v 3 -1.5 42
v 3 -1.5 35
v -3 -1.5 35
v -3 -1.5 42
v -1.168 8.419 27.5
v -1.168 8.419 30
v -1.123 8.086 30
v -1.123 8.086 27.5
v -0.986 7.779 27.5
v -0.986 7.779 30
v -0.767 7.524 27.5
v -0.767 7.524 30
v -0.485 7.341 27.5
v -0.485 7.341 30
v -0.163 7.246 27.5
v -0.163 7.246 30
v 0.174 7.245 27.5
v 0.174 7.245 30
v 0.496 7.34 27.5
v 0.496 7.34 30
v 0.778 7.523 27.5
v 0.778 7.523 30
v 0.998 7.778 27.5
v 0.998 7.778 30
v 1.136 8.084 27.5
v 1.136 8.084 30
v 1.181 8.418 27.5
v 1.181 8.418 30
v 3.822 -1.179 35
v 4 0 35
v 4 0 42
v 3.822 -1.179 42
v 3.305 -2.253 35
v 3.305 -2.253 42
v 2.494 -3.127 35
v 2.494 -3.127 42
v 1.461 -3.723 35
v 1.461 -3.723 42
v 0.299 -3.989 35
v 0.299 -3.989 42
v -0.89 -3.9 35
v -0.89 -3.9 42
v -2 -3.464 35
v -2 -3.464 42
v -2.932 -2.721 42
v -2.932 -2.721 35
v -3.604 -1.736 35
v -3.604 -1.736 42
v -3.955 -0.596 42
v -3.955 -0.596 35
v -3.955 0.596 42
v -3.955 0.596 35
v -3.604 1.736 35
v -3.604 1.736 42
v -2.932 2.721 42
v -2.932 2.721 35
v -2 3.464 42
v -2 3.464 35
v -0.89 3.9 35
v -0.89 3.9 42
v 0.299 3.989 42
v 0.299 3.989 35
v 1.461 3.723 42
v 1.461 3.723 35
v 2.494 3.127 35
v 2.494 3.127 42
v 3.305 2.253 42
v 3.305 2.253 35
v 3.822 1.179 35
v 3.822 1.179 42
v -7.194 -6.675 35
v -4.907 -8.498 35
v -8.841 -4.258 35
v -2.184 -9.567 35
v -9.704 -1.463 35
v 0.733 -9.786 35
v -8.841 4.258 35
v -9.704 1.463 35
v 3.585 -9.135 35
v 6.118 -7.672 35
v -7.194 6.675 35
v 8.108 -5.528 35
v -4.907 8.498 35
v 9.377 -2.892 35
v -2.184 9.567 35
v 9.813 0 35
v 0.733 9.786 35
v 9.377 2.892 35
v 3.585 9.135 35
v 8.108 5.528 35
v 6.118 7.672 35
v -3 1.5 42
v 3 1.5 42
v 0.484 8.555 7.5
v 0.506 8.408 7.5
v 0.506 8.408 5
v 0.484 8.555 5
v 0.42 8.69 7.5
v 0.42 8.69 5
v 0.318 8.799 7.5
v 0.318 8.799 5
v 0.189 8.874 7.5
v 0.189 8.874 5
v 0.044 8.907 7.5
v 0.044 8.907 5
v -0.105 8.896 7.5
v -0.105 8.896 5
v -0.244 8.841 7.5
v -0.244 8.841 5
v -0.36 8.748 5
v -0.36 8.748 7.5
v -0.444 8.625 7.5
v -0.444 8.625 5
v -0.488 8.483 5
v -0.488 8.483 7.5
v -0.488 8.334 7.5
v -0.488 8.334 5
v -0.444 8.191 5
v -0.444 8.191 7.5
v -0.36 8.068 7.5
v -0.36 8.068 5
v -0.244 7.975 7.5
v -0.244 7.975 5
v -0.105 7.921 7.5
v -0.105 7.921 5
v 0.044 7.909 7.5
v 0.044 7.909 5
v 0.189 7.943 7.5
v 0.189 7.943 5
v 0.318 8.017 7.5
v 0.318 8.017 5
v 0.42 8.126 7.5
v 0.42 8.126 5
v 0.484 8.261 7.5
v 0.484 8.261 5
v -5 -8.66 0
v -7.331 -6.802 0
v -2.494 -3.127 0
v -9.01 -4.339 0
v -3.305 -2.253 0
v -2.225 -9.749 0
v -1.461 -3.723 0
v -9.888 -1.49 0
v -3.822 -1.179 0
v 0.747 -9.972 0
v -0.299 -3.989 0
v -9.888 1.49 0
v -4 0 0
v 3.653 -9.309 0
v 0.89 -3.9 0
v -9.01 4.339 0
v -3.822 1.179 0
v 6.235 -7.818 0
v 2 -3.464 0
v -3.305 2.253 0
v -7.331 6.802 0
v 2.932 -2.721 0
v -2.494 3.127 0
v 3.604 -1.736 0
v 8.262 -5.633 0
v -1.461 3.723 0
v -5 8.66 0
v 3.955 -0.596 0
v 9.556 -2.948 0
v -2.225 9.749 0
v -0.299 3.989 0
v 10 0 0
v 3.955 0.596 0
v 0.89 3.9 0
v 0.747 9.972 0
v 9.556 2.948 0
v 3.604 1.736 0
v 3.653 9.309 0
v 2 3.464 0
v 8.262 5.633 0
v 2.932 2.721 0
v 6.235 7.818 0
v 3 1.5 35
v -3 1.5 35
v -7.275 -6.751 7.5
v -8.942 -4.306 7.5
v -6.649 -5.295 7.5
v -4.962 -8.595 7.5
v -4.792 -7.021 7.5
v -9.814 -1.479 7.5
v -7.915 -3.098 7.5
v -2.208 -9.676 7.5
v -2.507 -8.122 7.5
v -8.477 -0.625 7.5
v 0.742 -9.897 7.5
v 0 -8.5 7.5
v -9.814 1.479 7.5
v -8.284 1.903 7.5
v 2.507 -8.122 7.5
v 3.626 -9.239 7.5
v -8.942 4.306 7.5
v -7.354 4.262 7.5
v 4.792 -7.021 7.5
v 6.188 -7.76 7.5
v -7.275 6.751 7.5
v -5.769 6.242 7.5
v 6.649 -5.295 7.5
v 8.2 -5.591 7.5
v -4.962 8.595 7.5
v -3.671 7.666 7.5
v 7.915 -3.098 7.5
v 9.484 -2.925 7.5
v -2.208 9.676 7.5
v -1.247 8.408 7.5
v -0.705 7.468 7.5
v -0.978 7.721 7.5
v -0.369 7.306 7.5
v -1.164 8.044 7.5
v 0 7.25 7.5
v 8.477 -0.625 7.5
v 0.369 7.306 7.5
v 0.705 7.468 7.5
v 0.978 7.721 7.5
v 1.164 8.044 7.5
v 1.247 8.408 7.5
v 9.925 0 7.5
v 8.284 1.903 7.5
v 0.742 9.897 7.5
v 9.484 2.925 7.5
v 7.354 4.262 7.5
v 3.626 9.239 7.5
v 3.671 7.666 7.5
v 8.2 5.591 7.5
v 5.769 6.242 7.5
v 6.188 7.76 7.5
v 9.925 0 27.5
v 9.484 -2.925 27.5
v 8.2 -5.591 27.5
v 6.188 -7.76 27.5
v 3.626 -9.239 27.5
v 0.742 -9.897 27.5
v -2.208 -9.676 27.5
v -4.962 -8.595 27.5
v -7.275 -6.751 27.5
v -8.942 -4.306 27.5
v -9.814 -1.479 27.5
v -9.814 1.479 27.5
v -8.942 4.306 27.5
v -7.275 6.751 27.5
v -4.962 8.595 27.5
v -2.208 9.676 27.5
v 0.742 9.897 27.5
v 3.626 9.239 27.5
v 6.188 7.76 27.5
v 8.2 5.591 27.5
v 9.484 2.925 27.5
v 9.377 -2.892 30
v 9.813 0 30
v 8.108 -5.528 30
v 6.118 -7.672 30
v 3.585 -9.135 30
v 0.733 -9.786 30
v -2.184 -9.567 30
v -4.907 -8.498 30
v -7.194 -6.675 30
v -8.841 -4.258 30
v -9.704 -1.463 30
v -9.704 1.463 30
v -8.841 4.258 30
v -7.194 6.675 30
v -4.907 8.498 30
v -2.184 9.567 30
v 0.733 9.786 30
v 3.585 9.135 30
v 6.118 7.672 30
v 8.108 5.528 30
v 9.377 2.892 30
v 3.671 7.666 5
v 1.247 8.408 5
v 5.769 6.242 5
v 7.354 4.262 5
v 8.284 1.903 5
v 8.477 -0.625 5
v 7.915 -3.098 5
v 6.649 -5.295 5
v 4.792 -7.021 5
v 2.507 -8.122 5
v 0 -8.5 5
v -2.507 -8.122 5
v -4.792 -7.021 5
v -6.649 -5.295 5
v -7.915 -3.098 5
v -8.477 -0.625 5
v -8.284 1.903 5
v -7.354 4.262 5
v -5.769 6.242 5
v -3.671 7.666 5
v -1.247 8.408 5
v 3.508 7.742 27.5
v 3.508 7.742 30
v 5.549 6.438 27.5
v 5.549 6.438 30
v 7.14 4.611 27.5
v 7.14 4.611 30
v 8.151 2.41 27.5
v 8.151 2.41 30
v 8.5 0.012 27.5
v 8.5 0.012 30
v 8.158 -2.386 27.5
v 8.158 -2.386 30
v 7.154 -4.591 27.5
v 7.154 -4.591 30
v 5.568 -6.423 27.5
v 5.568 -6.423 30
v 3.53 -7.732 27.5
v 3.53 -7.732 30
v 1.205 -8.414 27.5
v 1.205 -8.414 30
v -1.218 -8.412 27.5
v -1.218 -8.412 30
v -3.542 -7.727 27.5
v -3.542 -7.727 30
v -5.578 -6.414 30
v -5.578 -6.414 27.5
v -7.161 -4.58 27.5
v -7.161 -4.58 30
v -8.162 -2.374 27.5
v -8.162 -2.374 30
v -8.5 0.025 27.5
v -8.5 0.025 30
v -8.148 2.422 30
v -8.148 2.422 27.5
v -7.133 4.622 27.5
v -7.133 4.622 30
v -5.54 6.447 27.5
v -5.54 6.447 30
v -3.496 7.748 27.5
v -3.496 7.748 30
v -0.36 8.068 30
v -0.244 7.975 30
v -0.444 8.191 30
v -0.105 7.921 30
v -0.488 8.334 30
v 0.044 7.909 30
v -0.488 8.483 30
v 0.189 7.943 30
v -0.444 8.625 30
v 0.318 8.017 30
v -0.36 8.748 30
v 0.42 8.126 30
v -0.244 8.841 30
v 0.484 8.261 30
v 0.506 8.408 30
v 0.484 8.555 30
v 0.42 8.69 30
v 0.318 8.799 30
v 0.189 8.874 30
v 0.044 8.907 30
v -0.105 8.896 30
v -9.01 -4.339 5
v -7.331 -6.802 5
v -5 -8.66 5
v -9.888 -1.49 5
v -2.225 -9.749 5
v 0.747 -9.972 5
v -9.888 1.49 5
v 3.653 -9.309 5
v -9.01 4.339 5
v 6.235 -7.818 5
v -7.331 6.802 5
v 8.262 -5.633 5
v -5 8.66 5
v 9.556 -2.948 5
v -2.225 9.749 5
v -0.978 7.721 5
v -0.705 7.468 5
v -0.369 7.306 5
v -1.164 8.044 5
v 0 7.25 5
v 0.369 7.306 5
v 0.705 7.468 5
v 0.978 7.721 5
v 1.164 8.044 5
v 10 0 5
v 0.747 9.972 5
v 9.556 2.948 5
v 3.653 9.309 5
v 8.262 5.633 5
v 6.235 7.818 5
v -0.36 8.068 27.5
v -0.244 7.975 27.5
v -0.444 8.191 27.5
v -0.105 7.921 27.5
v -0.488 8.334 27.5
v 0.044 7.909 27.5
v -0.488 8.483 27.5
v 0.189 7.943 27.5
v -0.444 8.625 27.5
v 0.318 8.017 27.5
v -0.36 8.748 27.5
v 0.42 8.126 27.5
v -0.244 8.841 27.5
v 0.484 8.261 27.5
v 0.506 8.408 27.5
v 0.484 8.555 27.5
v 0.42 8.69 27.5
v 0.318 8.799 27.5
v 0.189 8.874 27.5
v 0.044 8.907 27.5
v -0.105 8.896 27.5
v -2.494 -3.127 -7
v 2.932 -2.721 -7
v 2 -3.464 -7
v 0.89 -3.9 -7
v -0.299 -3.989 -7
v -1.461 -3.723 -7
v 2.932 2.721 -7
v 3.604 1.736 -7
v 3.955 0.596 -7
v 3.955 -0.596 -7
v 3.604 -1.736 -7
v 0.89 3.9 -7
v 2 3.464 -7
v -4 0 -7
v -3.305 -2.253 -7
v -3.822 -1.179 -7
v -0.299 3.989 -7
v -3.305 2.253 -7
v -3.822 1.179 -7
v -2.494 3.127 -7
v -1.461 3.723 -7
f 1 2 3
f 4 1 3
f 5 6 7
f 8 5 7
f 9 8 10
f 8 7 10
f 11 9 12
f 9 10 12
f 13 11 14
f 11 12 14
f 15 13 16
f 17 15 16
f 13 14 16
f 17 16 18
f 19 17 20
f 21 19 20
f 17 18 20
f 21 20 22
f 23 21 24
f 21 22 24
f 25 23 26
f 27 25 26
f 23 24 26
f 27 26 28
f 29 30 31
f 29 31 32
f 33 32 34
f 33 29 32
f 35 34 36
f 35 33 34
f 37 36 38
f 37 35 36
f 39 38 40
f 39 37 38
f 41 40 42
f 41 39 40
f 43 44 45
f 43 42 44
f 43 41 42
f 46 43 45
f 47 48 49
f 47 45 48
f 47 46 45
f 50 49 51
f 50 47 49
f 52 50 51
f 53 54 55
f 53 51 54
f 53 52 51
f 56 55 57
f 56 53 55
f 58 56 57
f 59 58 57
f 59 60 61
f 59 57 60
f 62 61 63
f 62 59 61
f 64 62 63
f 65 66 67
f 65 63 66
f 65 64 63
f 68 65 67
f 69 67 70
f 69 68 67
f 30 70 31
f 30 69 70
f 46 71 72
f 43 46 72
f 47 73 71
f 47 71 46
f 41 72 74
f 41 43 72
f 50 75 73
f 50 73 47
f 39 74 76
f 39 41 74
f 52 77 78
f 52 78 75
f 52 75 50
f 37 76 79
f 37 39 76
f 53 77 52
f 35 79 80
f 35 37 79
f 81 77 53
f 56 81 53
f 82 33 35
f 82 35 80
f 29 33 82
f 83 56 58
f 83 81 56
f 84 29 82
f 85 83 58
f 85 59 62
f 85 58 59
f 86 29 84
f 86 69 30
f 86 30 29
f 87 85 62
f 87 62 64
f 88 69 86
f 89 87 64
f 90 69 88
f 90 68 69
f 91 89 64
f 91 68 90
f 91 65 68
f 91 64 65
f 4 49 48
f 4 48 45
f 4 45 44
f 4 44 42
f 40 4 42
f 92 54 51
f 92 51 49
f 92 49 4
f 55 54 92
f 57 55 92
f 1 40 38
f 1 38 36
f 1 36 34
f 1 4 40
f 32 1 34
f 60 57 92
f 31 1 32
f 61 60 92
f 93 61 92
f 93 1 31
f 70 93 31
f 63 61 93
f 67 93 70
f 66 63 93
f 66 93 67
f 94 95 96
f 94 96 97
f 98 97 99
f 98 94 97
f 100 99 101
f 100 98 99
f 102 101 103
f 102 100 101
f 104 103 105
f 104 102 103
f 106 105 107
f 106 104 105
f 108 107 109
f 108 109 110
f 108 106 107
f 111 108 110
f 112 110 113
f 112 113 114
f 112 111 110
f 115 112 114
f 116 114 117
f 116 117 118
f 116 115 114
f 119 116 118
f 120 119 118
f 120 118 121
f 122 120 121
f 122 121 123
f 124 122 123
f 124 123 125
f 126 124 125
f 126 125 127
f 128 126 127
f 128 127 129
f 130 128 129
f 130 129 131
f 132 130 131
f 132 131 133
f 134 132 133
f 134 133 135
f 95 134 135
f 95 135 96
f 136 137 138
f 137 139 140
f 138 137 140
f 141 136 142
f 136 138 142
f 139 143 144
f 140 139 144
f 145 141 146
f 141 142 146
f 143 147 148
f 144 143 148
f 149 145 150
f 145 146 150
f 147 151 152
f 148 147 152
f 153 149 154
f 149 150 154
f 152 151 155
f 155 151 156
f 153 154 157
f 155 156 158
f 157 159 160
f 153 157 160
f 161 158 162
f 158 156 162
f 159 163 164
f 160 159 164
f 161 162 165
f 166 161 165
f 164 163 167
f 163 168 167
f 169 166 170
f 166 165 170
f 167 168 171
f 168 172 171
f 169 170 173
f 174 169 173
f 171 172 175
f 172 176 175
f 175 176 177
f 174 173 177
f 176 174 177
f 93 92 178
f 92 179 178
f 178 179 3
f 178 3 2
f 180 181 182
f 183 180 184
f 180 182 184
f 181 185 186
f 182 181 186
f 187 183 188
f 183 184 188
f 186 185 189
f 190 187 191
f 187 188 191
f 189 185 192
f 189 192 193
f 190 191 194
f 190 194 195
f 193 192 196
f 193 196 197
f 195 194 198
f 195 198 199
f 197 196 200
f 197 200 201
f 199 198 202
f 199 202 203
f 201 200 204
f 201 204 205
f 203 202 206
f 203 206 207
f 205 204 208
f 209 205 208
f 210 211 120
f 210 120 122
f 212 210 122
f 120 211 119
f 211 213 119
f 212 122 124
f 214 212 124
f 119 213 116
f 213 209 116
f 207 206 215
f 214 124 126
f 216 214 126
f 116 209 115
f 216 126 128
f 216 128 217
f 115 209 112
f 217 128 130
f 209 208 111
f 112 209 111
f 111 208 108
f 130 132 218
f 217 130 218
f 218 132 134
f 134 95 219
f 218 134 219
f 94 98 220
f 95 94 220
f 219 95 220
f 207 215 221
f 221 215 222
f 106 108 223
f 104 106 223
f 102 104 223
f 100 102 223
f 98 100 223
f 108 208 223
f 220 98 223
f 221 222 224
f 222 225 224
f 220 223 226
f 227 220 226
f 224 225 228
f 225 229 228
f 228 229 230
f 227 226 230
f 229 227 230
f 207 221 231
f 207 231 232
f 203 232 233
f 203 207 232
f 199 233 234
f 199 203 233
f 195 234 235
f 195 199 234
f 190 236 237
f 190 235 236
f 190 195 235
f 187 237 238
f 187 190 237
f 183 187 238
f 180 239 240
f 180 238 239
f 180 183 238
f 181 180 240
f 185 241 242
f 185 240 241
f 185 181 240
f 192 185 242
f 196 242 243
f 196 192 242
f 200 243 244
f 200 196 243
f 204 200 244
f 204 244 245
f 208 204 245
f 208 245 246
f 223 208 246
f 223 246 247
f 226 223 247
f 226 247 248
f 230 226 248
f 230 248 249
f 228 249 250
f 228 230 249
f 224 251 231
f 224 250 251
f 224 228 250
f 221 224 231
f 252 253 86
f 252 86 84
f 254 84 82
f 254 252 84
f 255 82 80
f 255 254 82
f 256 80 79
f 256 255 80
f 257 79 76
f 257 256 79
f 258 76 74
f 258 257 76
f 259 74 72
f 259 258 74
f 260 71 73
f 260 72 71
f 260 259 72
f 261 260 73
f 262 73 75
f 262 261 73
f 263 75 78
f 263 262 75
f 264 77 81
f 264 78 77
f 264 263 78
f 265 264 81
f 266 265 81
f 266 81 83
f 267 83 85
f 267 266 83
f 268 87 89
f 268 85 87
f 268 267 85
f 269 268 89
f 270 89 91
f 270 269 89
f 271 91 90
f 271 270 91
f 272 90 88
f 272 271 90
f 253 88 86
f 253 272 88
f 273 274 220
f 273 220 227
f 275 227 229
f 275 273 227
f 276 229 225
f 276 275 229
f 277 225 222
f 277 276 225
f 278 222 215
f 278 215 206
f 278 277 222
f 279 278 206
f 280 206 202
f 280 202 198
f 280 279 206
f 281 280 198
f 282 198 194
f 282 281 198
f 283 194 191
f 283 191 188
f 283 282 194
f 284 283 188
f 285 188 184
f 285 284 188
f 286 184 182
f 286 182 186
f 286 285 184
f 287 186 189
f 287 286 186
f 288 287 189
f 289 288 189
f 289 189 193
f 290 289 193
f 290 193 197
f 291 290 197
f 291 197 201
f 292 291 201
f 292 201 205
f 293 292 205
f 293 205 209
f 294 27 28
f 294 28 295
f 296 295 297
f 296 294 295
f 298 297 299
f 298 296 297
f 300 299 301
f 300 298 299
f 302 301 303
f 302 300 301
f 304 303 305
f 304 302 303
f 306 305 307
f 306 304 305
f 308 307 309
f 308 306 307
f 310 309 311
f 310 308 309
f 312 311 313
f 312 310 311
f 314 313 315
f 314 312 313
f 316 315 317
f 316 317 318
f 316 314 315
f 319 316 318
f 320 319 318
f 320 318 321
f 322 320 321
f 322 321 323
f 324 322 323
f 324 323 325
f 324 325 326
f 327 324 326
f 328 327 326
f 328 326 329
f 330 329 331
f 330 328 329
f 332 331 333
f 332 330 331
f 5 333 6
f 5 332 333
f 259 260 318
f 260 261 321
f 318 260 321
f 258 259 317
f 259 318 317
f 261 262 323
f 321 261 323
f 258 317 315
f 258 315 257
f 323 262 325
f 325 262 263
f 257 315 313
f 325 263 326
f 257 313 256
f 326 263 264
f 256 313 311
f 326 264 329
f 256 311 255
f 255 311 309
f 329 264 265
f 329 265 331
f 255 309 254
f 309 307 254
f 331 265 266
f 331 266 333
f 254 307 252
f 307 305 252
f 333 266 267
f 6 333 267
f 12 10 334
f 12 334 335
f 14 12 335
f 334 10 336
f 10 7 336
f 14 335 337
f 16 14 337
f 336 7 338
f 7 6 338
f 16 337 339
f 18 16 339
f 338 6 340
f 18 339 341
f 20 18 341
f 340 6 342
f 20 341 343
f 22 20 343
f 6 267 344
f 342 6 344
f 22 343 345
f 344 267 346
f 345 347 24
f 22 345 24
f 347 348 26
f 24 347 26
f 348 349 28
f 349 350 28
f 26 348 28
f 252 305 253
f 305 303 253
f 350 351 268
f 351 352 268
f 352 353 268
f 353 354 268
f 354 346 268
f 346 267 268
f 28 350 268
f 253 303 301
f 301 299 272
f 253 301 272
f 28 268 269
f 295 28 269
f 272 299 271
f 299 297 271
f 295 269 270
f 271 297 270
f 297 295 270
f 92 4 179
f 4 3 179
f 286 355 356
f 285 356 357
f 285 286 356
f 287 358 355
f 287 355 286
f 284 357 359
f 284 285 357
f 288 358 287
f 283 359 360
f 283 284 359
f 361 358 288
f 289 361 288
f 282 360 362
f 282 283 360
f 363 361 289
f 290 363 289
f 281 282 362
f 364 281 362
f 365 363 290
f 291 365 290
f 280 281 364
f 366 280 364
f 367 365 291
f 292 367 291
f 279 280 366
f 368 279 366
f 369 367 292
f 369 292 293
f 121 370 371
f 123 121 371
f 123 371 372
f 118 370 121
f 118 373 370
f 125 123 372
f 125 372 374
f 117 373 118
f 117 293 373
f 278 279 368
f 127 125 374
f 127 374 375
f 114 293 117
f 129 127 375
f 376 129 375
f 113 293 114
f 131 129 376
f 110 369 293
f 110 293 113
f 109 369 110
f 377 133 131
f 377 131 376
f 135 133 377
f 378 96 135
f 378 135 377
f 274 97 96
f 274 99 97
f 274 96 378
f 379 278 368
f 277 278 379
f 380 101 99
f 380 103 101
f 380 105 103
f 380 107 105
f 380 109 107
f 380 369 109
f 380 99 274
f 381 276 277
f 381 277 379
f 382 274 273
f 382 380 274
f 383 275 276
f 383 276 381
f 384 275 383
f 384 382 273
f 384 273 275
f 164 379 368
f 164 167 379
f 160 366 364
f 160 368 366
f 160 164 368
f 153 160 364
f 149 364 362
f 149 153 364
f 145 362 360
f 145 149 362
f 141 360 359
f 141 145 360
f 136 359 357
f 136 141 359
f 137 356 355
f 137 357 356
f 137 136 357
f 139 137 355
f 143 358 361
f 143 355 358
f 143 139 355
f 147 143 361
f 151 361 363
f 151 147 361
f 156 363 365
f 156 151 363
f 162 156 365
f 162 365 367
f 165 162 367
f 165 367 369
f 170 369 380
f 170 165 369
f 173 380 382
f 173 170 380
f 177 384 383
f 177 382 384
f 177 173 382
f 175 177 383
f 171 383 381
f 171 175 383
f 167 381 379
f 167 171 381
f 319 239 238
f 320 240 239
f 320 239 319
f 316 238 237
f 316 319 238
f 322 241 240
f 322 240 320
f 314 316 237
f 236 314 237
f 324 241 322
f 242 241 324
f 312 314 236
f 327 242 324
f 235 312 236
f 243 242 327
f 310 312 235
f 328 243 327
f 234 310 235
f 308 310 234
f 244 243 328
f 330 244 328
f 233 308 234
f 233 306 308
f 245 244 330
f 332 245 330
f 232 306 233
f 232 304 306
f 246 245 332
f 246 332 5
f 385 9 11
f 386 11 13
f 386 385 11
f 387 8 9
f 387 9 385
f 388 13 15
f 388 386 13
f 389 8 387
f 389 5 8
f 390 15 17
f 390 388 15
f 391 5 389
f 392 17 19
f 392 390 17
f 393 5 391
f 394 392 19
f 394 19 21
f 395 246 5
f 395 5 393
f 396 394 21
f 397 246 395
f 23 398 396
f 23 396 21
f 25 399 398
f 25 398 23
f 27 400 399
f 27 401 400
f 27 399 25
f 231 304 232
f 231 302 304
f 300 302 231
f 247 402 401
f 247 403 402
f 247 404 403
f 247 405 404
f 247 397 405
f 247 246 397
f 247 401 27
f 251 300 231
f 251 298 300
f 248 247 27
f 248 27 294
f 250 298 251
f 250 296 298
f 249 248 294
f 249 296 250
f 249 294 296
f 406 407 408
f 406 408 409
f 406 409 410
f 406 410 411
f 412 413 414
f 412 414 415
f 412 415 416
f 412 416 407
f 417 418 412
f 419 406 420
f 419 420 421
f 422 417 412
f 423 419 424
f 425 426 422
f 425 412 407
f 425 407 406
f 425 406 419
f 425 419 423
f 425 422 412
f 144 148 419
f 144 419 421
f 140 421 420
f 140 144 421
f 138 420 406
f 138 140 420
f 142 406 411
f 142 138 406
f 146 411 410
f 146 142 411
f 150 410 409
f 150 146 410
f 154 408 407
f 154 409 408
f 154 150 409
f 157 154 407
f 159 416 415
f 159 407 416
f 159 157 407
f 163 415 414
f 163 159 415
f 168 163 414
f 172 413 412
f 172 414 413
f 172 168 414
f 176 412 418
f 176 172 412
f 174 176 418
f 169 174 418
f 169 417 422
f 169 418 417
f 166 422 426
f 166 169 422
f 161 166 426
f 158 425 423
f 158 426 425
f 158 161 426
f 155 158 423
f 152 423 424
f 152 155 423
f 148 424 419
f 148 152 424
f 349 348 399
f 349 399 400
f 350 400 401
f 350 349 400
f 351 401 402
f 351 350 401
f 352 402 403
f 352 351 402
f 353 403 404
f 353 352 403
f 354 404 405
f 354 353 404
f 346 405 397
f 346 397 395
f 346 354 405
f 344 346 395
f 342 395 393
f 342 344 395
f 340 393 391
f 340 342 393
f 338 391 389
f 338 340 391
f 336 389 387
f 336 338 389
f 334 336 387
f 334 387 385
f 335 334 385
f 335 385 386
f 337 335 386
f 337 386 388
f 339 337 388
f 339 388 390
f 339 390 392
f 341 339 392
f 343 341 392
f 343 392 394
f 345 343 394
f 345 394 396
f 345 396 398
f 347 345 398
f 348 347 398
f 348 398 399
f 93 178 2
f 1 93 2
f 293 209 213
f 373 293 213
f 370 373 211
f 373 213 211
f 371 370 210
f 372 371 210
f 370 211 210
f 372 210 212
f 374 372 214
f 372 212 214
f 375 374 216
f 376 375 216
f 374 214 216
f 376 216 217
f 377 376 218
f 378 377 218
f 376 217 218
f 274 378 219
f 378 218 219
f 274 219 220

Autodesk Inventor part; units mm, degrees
ref_plane "YZ Plane" through (0, 0, 0) normal (1, 0, 0) x (0, 1, 0)
ref_plane "XZ Plane" through (0, 0, 0) normal (0, 1, 0) x (-1, 0, 0)
ref_plane "XY Plane" through (0, 0, 0) normal (0, 0, 1) x (1, 0, 0)
sketch "Sketch1" plane through (0, 0, 0) normal (0, 0, 1) x (1, 0, 0)
  circle A0 centre (0, 0) radius 10
  dimension "d0" = 20
extrude "Extrusion1" add sketch "Sketch1" along normal blind 5
sketch "Sketch2" plane through (0, 0, 5) normal (0, 0, 1) x (1, 0, 0)
  circle A0 centre (0, 0) radius 8.5
  circle A1 centre (-6.4588, 5.5258) radius 1.5
  dimension "d3" = 17
  dimension "d4" = 3
extrude "Extrusion2" add sketch "Sketch2" along normal blind 2.5 contours A0 A1 | A1 A0 picked at (2.8228, -1.7231) picked at (-6.0787, 5.1859)
sketch "Sketch3" plane through (0, 0, 7.5) normal (0, 0, 1) x (1, 0, 0)
  circle A0 centre (0, 0) radius 8.5 projected
  circle A1 centre (0, 8.5) radius 1.25
  dimension "d7" = 2.5
extrude "Extrusion3" cut sketch "Sketch3" against normal blind 2.5 contours A1 A0 | A0 A1 picked at (0, 8.0765) picked at (0.0361, 8.9083)
sketch "Sketch4" plane through (0, 0, 7.5) normal (0, 0, 1) x (1, 0, 0)
  line L0 (-1.2337, 8.4081) -> (1.2466, 8.4081)
  circle A0 centre (0.0064, 8.4081) radius 0.5
  circle A1 centre (0, 0) radius 10 projected
  dimension "d10" = 8.4081
  dimension "d11" = 1
extrude "Extrusion4" add sketch "Sketch4" against normal blind 2.5 contours A0 L0 | L0 A0
sketch "Sketch5" plane through (0, 0, 7.5) normal (0, 0, 1) x (1, 0, 0)
  circle A0 centre (0, 0) radius 9.9248
extrude "Extrusion5" add sketch "Sketch5" along normal blind 20
sketch "Sketch6" plane through (0, 0, 27.5) normal (0, 0, 1) x (1, 0, 0)
  circle A0 centre (0, 0) radius 8.5
extrude "Extrusion6" add sketch "Sketch6" along normal blind 2.5
sketch "Sketch7" plane through (0, 0, 30) normal (0, 0, 1) x (1, 0, 0)
  circle A0 centre (0.0064, 8.4081) radius 0.5 projected
  circle A1 centre (0.0064, 8.4081) radius 0.5
  circle A2 centre (0.0064, 8.4081) radius 1.1746
  point P0 (0, 0)
extrude "Extrusion7" cut sketch "Sketch7" against normal blind 2.5 contours A0 | A2
sketch "Sketch8" plane through (0, 0, 30) normal (0, 0, 1) x (1, 0, 0)
  circle A0 centre (0.0064, 8.4081) radius 0.5 projected
  circle A1 centre (0.0064, 8.4081) radius 0.5
  point P0 (0, 0)
extrude "Extrusion8" add sketch "Sketch8" against normal blind 2.5
sketch "Sketch9" plane through (0, 0, 30) normal (0, 0, 1) x (1, 0, 0)
  circle A0 centre (0, 0) radius 9.8132
extrude "Extrusion9" add sketch "Sketch9" along normal blind 5
sketch "Sketch10" plane through (0, 0, 35) normal (0, 0, 1) x (1, 0, 0)
  circle A0 centre (0, 0) radius 4
  line L0 (-3, 1.5) -> (3, 1.5)
  line L1 (3, 1.5) -> (3, -1.5)
  line L2 (3, -1.5) -> (-3, -1.5)
  line L3 (-3, -1.5) -> (-3, 1.5)
  dimension "d24" = 8
  dimension "d25" = 6
  dimension "d26" = 3
  dimension "d27" = 1.5
  dimension "d28" = 3
extrude "Extrusion10" add sketch "Sketch10" along normal blind 7
sketch "Sketch11" plane through (0, 0, 0) normal (0, 0, -1) x (-1, 0, 0)
  circle A0 centre (0, 0) radius 4
  dimension "d31" = 8
extrude "Extrusion11" add sketch "Sketch11" along normal blind 7
properties part number "Roller"
